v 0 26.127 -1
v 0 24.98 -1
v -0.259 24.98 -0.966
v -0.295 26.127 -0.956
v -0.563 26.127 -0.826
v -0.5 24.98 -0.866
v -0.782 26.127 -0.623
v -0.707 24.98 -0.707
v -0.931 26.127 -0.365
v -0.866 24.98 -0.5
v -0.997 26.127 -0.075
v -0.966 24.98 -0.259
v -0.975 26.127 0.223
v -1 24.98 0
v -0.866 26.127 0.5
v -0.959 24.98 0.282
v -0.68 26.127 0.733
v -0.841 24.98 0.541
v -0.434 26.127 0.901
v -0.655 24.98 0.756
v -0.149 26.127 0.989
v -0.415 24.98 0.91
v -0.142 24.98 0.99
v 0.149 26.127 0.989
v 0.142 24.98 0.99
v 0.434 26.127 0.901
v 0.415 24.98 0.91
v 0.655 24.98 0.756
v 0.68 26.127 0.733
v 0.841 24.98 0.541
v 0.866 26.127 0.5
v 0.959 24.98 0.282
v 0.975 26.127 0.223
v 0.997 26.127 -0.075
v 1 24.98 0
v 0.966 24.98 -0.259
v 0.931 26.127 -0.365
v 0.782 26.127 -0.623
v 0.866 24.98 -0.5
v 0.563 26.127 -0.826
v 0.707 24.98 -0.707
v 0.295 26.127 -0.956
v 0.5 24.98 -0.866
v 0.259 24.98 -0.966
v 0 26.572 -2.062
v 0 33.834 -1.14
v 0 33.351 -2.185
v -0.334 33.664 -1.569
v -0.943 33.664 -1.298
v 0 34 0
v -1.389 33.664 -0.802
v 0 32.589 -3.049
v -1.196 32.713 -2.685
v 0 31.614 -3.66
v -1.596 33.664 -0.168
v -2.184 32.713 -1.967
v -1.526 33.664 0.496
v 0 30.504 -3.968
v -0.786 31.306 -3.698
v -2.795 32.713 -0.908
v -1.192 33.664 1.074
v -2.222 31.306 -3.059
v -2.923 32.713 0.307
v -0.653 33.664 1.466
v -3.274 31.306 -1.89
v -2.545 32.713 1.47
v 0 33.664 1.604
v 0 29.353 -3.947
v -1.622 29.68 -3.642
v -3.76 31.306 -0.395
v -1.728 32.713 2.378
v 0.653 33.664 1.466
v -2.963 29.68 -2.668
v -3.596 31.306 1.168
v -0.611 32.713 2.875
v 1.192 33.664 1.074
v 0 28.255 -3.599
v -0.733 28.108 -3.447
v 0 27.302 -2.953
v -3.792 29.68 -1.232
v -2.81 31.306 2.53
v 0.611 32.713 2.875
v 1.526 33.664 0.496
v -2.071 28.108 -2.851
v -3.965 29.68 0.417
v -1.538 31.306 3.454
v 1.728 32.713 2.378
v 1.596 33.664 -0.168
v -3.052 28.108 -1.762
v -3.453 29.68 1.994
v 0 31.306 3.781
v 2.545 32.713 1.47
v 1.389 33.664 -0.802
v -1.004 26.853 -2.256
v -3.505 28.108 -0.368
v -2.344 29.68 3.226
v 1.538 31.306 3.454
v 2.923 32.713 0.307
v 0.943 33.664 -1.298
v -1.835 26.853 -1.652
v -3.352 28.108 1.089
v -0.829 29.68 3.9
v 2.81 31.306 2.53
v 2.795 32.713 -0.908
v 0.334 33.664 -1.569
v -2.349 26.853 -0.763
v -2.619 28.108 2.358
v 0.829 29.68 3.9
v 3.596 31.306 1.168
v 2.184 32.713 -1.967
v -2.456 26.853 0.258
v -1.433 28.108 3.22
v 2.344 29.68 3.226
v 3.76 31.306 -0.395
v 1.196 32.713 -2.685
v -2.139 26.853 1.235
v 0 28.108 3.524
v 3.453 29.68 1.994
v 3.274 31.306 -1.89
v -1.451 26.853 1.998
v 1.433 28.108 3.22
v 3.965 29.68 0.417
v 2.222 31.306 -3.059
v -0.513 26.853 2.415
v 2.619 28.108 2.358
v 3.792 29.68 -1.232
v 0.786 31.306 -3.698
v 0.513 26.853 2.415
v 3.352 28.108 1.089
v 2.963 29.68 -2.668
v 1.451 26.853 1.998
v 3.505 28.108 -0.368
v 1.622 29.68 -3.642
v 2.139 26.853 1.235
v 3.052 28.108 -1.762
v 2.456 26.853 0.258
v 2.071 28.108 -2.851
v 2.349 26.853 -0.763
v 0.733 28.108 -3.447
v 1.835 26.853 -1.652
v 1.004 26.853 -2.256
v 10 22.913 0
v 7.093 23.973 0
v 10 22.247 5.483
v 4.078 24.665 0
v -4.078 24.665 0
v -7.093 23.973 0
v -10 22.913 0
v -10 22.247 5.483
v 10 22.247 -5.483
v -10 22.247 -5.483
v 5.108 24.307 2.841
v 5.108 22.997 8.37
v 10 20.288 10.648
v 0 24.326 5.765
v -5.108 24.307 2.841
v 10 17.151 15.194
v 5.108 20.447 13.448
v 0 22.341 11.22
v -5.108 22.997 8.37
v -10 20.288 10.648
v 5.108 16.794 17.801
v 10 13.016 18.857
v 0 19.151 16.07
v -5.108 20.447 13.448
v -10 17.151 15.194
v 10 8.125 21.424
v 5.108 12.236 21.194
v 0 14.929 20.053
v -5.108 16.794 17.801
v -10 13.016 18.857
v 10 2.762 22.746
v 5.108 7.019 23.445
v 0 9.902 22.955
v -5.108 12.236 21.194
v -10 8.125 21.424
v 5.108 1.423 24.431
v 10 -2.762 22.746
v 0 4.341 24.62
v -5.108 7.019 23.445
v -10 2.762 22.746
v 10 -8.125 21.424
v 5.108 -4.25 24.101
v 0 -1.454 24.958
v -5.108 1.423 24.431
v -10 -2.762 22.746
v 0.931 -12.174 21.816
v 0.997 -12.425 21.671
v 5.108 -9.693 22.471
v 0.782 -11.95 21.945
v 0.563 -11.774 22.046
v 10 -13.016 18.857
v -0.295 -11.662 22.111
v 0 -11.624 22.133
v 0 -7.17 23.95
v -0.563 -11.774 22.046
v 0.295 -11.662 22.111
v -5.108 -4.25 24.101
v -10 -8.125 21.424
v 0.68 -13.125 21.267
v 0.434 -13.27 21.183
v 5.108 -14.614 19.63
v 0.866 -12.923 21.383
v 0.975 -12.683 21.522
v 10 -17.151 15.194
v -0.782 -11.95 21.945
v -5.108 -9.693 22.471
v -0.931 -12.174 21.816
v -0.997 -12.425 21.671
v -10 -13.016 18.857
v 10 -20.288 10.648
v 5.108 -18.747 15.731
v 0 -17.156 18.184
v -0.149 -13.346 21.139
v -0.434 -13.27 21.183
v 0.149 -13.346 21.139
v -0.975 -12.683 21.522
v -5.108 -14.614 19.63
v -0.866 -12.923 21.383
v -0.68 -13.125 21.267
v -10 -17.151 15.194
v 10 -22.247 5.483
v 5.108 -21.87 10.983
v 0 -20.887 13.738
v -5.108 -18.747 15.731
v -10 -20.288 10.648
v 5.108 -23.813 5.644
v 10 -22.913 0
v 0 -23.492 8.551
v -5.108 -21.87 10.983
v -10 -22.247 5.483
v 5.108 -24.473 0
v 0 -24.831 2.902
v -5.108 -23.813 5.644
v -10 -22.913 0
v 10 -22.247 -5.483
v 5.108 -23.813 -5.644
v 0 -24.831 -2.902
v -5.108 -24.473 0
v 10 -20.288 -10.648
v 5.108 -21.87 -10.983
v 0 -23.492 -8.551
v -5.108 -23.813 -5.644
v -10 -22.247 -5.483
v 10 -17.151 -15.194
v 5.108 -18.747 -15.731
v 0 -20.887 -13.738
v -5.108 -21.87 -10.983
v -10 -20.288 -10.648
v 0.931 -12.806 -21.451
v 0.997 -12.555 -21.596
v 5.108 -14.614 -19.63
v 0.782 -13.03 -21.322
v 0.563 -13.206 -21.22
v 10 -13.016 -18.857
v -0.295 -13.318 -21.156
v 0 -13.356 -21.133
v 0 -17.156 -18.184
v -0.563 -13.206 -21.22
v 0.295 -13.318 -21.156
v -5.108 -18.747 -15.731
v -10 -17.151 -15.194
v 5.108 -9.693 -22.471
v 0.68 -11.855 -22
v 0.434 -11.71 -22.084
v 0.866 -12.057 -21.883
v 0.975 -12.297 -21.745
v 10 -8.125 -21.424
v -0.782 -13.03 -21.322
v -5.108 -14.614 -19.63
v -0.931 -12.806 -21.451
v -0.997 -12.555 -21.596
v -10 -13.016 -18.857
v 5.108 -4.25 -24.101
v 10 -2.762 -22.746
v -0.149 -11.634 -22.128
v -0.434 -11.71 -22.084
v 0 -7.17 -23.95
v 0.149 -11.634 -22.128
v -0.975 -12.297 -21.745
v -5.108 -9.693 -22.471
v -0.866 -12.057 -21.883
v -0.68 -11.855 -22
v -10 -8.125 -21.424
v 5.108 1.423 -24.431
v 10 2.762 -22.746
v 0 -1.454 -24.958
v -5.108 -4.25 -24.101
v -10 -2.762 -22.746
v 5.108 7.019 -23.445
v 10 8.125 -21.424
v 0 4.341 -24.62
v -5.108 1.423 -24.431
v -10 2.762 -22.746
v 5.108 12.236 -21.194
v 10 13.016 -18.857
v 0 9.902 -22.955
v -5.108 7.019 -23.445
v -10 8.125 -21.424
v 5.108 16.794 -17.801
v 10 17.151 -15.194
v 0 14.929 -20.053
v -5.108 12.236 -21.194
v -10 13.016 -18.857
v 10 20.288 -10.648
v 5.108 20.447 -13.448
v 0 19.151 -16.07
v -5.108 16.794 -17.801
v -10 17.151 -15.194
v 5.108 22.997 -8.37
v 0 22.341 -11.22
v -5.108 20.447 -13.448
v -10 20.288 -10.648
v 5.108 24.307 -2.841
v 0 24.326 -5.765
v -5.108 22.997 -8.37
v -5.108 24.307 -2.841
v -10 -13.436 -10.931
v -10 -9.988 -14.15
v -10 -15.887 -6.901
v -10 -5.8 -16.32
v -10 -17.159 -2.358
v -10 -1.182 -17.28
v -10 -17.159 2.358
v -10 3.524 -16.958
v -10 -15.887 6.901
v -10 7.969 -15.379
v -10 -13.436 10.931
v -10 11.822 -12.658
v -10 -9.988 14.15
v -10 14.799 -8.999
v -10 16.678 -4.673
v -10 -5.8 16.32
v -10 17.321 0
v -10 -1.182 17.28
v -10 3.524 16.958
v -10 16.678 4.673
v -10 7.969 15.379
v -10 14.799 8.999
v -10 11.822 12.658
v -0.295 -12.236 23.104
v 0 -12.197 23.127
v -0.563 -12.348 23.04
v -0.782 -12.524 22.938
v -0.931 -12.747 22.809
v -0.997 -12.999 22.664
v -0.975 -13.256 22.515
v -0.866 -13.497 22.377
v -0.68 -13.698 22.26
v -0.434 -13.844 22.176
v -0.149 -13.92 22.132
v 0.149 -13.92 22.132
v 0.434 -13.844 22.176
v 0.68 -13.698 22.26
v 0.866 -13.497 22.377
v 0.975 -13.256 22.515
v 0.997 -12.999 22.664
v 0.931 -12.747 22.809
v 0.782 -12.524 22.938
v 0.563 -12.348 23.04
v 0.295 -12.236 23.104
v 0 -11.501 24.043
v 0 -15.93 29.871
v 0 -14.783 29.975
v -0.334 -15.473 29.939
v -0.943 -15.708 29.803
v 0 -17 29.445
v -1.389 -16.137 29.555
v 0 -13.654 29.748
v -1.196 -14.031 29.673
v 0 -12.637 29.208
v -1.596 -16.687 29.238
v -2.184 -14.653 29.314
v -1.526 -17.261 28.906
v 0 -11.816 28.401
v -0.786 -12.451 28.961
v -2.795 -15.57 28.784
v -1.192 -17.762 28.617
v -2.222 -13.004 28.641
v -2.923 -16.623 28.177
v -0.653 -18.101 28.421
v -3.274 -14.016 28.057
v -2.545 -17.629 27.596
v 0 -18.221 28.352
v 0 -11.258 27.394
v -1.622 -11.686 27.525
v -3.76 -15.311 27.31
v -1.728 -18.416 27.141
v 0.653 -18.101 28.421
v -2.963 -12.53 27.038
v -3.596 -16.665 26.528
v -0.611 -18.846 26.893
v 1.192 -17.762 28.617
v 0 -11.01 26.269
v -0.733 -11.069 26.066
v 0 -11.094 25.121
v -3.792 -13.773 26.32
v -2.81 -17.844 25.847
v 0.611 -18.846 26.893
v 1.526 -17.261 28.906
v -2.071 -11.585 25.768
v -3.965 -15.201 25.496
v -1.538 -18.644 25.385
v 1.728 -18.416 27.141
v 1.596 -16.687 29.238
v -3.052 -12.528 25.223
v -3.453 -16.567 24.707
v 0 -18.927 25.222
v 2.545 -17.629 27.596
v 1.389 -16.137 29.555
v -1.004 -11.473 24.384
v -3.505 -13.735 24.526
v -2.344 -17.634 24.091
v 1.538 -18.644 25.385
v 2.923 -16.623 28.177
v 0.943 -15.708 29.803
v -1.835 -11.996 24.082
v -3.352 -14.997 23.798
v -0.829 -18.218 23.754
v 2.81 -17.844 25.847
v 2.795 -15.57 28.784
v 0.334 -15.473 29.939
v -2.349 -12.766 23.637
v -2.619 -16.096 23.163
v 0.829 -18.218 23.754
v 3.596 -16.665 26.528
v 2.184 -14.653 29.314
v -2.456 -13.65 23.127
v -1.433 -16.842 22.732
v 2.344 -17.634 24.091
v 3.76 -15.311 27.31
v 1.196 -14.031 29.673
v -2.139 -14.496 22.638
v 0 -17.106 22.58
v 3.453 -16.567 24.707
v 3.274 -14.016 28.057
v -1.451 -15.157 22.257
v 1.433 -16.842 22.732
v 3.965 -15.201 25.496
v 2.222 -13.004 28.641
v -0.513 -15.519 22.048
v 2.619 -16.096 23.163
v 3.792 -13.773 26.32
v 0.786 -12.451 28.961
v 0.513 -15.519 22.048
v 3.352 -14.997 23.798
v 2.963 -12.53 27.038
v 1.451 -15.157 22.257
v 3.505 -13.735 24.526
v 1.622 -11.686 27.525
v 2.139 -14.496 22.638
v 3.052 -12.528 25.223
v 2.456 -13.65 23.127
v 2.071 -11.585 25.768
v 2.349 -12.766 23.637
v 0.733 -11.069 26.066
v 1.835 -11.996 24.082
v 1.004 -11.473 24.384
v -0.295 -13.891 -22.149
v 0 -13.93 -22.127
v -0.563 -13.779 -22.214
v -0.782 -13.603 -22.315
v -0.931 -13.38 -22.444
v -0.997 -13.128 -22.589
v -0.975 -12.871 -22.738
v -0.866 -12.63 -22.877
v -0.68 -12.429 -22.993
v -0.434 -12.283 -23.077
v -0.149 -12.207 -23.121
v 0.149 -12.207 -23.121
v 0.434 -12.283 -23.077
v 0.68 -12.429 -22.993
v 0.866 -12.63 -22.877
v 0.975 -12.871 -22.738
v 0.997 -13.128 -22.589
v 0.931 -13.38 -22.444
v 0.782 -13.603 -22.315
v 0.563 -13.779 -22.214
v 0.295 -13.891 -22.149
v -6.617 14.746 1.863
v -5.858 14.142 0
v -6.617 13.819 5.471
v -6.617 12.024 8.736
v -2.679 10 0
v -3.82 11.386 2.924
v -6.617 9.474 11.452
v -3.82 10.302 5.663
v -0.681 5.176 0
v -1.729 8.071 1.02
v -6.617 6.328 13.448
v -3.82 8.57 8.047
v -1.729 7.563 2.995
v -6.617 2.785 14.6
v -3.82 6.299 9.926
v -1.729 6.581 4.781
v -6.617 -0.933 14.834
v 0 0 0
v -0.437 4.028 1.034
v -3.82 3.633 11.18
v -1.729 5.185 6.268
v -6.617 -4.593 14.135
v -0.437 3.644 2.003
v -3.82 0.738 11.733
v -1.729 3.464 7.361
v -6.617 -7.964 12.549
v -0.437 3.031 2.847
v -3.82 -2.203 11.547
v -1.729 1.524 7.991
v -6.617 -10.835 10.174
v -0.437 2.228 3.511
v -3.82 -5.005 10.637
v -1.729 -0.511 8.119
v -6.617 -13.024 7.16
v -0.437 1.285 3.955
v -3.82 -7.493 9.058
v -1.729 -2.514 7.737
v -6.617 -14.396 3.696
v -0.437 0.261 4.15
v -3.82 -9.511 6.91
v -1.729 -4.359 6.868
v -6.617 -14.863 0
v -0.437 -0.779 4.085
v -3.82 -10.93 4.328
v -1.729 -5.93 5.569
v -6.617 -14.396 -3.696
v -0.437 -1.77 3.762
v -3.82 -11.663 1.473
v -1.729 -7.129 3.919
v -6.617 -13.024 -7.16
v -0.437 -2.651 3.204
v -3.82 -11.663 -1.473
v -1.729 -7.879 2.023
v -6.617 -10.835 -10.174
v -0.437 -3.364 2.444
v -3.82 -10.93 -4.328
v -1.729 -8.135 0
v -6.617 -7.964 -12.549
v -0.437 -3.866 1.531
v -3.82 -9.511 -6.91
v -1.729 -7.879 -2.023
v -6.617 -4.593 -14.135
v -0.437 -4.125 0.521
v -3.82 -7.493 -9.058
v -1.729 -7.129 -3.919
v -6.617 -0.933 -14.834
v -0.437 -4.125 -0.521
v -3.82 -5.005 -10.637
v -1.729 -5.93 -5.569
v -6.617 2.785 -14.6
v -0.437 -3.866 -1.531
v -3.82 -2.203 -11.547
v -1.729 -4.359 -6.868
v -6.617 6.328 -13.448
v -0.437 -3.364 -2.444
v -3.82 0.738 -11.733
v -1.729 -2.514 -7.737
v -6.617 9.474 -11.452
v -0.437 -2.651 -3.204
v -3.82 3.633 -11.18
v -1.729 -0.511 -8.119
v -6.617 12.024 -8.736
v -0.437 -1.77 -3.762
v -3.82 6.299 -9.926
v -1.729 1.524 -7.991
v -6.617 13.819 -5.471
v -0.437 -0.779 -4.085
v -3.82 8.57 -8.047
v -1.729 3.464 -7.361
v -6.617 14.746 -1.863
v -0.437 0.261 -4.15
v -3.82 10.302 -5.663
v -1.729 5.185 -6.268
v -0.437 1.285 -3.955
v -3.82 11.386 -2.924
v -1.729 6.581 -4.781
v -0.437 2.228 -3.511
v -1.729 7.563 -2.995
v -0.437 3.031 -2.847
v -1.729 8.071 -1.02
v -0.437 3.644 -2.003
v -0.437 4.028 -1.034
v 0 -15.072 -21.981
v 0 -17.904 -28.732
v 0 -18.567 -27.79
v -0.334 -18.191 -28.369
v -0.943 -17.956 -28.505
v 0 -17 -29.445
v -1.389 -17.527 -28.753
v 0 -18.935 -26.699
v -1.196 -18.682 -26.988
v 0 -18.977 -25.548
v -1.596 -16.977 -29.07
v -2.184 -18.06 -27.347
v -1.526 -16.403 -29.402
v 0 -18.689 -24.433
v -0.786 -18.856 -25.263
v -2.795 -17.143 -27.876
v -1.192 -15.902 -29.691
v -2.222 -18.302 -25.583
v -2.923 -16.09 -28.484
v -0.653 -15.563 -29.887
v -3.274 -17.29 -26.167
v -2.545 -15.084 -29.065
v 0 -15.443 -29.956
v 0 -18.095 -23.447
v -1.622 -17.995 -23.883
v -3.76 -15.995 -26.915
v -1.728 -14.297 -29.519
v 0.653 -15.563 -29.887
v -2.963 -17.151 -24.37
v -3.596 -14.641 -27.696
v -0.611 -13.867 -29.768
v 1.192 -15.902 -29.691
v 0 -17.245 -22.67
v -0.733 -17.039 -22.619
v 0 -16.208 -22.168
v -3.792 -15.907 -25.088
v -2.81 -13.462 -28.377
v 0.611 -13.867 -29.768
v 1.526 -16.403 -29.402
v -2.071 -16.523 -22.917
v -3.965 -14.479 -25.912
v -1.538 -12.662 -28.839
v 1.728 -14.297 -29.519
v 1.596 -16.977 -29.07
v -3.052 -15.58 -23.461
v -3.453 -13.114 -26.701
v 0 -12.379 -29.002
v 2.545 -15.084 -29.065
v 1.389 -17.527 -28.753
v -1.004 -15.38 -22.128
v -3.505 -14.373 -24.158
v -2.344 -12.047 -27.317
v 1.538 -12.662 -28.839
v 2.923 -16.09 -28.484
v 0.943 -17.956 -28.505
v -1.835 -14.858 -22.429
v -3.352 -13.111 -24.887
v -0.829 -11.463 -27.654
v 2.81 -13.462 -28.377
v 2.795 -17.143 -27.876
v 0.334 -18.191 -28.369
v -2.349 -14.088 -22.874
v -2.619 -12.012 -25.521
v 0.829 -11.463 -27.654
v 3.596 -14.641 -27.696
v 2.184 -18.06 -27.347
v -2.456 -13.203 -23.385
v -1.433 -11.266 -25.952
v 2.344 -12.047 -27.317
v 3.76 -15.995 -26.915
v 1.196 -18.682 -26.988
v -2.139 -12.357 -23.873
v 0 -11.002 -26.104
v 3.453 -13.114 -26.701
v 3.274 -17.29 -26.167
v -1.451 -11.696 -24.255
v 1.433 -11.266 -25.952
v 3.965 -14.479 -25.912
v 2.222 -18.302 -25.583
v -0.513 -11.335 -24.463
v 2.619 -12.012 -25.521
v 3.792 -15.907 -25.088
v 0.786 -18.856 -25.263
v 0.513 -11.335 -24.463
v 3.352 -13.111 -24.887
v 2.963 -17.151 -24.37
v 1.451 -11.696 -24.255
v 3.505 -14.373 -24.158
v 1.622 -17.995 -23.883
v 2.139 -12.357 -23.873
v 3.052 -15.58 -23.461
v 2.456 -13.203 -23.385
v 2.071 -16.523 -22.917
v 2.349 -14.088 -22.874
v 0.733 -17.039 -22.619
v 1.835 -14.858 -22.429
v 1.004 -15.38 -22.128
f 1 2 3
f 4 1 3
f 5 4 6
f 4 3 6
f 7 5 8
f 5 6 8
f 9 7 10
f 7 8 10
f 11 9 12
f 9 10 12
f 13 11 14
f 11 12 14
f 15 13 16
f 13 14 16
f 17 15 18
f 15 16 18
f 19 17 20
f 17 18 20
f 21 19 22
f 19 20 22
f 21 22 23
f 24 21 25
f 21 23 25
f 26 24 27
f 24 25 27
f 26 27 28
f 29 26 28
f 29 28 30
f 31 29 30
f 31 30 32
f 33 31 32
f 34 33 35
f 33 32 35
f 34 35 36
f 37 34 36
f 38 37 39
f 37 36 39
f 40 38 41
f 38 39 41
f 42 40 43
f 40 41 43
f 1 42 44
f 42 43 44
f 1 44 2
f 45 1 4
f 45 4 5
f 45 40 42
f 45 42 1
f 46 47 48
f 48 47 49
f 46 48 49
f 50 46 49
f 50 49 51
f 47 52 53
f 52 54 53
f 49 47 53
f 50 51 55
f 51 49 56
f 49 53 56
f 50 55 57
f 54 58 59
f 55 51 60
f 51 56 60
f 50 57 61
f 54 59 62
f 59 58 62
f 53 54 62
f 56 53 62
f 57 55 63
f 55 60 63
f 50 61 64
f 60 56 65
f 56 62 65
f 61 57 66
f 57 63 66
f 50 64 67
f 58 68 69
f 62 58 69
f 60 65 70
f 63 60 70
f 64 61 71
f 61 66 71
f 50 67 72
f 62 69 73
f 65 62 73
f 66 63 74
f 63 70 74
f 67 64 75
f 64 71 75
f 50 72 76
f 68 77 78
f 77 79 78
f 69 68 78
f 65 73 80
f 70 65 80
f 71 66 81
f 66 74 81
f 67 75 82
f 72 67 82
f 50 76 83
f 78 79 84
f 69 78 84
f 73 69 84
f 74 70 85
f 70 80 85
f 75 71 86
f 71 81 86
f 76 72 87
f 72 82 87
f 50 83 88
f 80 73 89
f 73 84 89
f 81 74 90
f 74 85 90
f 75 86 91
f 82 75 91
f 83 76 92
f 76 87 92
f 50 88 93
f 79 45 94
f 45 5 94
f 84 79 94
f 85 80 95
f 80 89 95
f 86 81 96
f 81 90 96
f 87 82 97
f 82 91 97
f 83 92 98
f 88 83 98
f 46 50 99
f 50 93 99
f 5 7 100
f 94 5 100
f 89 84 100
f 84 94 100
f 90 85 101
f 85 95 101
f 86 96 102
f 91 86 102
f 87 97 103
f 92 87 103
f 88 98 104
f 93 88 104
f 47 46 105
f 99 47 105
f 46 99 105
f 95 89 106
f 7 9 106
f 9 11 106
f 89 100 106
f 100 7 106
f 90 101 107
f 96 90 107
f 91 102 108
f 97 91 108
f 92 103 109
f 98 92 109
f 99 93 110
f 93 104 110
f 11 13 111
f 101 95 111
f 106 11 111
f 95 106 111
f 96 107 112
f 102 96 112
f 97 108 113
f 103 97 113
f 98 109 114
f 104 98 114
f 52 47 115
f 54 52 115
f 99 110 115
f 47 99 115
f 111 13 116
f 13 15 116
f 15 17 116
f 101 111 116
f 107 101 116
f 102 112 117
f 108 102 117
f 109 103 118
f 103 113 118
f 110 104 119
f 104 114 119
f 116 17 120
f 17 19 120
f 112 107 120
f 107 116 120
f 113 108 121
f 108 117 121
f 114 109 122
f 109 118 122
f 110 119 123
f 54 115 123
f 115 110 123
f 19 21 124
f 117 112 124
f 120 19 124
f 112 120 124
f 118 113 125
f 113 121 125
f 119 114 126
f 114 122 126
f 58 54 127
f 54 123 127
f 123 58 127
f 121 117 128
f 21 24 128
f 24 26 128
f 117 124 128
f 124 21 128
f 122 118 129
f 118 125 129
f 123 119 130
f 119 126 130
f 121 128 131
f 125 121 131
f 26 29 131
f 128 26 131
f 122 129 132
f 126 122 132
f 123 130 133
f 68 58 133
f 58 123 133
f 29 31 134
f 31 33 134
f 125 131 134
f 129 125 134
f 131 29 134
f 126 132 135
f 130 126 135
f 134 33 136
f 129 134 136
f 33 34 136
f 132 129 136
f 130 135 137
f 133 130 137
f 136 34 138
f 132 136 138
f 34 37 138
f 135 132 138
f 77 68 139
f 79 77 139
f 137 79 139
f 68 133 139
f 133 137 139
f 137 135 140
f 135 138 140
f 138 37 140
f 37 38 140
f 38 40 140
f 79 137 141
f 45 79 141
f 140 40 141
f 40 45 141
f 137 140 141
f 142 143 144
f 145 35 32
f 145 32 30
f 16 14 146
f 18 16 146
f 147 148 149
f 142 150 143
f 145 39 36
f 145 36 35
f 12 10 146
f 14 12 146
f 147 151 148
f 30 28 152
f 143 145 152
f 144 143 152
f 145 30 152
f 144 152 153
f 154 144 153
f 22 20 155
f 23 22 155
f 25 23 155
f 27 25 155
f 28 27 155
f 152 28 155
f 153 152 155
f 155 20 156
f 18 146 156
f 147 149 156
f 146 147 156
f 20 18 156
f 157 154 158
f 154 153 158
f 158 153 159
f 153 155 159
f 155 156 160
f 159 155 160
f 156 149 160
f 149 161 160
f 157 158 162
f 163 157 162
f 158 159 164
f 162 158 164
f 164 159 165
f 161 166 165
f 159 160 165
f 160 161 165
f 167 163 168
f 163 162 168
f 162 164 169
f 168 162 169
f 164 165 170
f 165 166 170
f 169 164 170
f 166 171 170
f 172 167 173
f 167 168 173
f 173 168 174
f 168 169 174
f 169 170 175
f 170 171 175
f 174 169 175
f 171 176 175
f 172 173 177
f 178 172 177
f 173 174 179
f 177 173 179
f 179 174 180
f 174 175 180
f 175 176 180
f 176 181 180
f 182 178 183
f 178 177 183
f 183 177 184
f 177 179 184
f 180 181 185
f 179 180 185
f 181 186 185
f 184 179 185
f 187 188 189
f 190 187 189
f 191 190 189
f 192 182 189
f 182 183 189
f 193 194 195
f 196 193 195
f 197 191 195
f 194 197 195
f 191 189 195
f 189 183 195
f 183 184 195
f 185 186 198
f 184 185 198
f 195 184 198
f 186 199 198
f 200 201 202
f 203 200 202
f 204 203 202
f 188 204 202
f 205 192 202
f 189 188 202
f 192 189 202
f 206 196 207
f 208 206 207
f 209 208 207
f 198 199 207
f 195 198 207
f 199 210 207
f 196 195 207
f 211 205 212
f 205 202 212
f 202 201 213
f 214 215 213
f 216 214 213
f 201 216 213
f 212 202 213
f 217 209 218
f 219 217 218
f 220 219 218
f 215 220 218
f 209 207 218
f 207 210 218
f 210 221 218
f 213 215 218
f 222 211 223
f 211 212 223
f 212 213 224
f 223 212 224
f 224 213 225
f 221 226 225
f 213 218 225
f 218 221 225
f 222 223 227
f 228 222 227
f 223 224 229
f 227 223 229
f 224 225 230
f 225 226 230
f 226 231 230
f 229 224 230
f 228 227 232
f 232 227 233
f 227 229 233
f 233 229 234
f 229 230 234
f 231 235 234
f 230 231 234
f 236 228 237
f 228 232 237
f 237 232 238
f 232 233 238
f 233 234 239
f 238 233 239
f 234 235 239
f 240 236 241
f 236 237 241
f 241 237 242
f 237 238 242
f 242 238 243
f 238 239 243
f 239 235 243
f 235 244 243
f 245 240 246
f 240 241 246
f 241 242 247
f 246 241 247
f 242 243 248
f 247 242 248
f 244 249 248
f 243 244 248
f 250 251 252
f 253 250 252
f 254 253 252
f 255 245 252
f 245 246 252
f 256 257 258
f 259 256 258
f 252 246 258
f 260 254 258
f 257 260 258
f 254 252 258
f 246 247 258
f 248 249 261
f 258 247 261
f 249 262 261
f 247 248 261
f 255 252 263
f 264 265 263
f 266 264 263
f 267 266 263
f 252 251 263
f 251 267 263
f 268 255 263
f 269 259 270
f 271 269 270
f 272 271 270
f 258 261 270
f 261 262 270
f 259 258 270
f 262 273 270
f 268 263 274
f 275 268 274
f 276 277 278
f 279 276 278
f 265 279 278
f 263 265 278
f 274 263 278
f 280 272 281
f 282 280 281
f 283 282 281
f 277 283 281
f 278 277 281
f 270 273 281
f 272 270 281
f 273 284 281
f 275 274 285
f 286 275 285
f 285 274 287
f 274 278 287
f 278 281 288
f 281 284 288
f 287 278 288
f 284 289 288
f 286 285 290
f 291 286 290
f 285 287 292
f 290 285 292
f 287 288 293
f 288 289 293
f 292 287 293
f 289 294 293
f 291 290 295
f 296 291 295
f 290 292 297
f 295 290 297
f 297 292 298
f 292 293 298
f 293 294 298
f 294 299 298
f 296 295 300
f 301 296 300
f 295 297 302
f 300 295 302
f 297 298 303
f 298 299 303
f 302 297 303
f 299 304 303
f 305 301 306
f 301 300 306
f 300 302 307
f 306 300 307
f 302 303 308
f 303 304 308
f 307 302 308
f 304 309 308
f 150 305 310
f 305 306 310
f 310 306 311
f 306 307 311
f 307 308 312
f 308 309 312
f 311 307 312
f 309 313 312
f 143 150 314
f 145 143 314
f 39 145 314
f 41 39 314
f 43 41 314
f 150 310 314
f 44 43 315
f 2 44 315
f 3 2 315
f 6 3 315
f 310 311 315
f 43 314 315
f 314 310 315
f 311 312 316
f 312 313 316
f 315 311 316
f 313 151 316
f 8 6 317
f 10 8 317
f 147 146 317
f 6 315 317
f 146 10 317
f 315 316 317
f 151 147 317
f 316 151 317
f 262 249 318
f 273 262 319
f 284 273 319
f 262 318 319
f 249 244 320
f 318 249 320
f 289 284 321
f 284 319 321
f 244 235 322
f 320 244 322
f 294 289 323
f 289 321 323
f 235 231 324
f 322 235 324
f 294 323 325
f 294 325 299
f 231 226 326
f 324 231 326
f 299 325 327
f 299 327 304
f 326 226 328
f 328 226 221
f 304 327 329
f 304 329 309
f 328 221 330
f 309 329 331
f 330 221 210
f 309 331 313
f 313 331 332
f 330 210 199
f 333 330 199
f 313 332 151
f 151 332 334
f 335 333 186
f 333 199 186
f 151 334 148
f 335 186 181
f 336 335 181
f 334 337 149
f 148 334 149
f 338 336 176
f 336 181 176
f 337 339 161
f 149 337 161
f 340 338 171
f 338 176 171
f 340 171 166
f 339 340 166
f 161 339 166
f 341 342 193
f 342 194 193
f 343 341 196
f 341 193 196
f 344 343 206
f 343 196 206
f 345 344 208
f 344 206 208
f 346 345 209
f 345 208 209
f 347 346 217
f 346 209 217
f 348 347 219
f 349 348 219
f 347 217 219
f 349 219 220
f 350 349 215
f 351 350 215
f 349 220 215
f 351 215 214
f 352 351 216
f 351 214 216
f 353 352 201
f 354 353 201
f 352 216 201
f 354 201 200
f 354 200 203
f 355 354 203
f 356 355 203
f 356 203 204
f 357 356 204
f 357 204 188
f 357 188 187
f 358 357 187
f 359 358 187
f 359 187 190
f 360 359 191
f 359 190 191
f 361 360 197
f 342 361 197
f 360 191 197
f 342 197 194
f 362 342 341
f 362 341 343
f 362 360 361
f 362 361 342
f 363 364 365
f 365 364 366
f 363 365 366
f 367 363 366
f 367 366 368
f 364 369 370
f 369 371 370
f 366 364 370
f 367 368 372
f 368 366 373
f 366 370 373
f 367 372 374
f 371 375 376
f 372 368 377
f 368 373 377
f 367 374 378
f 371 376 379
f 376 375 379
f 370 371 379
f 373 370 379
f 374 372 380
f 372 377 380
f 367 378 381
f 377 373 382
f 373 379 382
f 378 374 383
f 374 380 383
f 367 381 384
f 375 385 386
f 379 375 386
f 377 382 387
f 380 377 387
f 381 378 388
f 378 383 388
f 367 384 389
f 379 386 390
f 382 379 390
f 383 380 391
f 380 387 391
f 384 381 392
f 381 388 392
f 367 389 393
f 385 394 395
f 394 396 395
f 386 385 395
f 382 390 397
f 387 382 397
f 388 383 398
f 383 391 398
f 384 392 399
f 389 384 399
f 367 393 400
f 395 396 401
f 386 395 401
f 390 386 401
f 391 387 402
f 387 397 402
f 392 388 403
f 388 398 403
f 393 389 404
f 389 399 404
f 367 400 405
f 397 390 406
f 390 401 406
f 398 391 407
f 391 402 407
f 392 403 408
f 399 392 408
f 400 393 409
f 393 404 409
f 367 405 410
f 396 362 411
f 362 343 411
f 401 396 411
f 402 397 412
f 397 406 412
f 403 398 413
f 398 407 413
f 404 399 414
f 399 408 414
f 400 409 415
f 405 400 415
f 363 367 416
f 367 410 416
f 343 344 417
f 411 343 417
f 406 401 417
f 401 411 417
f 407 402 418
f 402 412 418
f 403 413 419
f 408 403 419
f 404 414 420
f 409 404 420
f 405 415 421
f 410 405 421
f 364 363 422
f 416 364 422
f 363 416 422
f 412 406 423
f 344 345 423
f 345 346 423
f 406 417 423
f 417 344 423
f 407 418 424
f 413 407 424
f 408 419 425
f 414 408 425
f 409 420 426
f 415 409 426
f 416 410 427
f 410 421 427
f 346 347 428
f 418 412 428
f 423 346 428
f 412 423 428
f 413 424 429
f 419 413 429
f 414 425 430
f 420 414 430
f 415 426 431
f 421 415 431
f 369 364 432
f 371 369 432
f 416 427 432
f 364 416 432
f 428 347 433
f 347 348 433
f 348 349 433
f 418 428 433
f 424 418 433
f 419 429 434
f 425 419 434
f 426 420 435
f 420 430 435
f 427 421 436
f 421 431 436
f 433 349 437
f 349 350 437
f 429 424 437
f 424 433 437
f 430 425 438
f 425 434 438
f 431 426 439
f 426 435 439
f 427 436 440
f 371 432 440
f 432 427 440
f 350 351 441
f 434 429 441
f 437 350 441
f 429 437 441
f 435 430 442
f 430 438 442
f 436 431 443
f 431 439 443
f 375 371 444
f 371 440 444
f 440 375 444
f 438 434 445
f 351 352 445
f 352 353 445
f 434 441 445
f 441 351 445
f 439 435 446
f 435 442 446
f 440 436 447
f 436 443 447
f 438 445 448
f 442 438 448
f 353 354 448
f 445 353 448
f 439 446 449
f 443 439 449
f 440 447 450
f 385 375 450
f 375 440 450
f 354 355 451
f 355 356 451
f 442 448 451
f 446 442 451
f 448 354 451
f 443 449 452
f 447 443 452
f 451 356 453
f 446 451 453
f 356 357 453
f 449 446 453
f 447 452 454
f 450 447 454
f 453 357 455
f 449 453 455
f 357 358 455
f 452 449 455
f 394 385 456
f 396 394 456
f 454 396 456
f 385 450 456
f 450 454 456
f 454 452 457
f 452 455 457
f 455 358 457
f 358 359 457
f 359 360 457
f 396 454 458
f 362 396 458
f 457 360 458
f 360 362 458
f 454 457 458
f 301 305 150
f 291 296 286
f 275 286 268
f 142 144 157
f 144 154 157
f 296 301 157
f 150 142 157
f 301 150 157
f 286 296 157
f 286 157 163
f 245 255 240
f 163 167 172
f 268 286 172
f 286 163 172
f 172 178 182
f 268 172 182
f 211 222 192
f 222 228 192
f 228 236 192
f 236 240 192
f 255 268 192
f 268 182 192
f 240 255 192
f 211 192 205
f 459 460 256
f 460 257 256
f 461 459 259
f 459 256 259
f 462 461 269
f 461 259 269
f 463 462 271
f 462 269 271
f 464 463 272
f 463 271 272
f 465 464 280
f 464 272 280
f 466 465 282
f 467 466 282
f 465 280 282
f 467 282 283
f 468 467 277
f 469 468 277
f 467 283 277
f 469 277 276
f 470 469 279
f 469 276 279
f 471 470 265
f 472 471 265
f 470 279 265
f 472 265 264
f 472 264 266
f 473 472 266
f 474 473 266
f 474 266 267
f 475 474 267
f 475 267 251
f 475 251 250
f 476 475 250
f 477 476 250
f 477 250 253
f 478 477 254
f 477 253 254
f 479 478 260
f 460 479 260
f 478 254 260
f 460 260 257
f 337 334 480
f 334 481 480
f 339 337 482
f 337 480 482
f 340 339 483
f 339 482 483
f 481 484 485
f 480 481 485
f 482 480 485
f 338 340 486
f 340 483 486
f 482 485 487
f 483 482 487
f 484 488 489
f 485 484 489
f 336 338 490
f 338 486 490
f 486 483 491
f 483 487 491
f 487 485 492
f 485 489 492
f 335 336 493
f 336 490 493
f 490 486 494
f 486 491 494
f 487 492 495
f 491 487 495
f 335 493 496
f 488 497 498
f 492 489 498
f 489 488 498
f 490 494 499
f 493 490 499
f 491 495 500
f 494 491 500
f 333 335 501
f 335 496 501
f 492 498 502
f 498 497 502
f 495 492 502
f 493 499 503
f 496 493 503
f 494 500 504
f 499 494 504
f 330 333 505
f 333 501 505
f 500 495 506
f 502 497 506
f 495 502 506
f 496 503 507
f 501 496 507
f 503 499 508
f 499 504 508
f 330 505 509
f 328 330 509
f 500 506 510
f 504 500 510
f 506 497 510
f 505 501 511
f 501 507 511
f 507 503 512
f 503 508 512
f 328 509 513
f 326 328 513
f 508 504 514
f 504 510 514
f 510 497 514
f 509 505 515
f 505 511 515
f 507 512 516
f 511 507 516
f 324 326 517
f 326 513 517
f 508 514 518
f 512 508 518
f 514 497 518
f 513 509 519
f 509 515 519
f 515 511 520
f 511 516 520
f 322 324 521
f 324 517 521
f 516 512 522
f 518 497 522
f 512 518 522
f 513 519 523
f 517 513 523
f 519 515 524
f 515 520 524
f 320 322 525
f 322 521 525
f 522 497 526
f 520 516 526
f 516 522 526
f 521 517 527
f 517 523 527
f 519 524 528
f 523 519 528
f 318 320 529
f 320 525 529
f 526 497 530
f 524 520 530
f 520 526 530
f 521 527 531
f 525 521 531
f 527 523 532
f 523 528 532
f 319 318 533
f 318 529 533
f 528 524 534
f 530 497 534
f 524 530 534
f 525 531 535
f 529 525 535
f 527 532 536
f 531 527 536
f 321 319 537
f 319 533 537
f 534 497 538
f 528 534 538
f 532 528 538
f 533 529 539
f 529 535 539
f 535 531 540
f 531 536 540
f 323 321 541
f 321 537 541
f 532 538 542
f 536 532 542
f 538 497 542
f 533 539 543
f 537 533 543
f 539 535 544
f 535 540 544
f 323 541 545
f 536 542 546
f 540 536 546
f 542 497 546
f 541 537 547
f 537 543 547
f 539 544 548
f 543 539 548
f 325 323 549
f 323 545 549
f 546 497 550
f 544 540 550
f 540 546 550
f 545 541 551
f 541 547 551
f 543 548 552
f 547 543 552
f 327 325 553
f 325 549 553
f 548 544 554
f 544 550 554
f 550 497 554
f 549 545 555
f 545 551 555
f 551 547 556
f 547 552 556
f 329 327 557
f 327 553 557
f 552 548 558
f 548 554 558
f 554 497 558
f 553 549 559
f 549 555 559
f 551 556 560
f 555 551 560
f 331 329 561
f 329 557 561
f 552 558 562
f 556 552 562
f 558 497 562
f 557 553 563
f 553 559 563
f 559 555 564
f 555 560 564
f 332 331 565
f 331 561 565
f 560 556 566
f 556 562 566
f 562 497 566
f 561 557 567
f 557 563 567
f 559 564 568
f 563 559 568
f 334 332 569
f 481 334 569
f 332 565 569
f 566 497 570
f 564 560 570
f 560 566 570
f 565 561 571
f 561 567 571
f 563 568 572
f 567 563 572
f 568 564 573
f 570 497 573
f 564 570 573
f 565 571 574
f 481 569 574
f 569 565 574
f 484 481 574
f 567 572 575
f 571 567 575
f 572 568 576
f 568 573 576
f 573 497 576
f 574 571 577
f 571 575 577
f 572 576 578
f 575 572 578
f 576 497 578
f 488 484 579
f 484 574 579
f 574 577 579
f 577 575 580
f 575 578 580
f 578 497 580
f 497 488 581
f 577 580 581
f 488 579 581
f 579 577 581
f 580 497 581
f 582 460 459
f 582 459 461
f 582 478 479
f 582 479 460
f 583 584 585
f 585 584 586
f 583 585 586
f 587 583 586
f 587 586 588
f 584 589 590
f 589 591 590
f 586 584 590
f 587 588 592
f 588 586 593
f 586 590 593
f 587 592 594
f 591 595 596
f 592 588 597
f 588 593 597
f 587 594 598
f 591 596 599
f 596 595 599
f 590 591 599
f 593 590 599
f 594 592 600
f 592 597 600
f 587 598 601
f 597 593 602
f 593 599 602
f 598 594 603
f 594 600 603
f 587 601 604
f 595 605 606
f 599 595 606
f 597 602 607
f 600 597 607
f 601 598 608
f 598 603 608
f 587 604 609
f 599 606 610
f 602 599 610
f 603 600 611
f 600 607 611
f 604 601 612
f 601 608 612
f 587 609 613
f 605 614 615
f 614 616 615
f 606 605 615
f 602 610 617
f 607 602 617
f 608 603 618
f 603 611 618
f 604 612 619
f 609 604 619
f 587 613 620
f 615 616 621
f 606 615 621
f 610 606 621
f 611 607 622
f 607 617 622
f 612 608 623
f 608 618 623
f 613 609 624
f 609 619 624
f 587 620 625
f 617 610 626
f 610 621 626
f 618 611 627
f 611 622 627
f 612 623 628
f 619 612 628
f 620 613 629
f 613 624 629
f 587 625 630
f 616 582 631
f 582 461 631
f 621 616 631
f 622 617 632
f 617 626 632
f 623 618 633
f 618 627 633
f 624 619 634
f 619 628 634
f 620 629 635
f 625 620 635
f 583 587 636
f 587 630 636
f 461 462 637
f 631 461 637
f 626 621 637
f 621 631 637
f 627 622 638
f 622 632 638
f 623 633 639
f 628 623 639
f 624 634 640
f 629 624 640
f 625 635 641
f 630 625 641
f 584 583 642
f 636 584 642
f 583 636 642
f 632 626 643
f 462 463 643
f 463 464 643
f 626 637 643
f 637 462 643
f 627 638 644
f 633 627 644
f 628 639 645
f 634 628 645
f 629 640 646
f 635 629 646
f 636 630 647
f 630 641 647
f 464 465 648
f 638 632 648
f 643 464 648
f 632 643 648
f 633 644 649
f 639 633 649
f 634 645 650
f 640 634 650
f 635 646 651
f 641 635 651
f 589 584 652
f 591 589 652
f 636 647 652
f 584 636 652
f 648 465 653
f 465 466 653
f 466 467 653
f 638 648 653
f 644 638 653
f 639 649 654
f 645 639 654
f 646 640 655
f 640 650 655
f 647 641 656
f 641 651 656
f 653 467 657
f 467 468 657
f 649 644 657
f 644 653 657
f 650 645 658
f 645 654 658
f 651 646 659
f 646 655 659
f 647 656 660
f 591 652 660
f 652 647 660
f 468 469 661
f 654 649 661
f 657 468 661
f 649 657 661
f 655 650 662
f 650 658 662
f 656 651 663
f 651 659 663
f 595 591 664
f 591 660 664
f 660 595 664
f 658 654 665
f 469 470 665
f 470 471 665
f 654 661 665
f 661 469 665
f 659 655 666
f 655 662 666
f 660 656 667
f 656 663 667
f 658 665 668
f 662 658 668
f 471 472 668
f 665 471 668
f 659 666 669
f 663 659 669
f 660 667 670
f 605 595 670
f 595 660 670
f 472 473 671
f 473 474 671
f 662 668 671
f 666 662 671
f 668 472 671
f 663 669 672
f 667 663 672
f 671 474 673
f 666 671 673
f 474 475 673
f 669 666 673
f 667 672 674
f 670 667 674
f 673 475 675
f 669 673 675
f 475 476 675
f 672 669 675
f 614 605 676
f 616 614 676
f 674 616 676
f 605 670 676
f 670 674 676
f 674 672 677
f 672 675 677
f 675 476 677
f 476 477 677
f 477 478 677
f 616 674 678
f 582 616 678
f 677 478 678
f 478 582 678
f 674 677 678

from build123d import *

# Parameters (mm, degrees)
MATRIZC1_COUNT = 3


with BuildPart() as part:
    # Croquis8 → Revolución4 (revolve)
    with BuildSketch(Plane.XY):
        with BuildLine():
            Line((-10, 22.912878475), (-10, 17.320508076))
            ThreePointArc((-10, 17.320508076), (-2.679491924, 10), (0, 0))
            Line((0, 0), (10, 0))
            Line((10, 0), (10, 22.912878475))
            ThreePointArc((10, 22.912878475), (0, 25), (-10, 22.912878475))
        make_face()
    revolve(axis=Axis((0, 0, 0), (1, 0, 0)))

    # Croquis3 → Revolución5 (revolve)
    with BuildSketch(Plane(origin=(0, 0, 0), x_dir=(0, 0, -1), z_dir=(1, 0, 0))):
        with BuildLine():
            Line((0, 25), (0, 34))
            ThreePointArc((0, 34), (3.968118785, 30.50401717), (1, 26.127016654))
            Line((1, 26.127016654), (1, 24.979991994))
            ThreePointArc((1, 24.979991994), (0.50010007, 24.994997498), (0, 25))
        make_face()
    revoluci_n5 = revolve(axis=Axis((0, 25, 0), (0, 1, 0)))

    # MatrizC1: Revolución5 ×3 about axis
    matrizc1_axis = Axis((0, 0, 0), (1, 0, 0))
    for i in range(1, MATRIZC1_COUNT):
        add(revoluci_n5.rotate(matrizc1_axis, i * 360 / MATRIZC1_COUNT))


solid = part.part
